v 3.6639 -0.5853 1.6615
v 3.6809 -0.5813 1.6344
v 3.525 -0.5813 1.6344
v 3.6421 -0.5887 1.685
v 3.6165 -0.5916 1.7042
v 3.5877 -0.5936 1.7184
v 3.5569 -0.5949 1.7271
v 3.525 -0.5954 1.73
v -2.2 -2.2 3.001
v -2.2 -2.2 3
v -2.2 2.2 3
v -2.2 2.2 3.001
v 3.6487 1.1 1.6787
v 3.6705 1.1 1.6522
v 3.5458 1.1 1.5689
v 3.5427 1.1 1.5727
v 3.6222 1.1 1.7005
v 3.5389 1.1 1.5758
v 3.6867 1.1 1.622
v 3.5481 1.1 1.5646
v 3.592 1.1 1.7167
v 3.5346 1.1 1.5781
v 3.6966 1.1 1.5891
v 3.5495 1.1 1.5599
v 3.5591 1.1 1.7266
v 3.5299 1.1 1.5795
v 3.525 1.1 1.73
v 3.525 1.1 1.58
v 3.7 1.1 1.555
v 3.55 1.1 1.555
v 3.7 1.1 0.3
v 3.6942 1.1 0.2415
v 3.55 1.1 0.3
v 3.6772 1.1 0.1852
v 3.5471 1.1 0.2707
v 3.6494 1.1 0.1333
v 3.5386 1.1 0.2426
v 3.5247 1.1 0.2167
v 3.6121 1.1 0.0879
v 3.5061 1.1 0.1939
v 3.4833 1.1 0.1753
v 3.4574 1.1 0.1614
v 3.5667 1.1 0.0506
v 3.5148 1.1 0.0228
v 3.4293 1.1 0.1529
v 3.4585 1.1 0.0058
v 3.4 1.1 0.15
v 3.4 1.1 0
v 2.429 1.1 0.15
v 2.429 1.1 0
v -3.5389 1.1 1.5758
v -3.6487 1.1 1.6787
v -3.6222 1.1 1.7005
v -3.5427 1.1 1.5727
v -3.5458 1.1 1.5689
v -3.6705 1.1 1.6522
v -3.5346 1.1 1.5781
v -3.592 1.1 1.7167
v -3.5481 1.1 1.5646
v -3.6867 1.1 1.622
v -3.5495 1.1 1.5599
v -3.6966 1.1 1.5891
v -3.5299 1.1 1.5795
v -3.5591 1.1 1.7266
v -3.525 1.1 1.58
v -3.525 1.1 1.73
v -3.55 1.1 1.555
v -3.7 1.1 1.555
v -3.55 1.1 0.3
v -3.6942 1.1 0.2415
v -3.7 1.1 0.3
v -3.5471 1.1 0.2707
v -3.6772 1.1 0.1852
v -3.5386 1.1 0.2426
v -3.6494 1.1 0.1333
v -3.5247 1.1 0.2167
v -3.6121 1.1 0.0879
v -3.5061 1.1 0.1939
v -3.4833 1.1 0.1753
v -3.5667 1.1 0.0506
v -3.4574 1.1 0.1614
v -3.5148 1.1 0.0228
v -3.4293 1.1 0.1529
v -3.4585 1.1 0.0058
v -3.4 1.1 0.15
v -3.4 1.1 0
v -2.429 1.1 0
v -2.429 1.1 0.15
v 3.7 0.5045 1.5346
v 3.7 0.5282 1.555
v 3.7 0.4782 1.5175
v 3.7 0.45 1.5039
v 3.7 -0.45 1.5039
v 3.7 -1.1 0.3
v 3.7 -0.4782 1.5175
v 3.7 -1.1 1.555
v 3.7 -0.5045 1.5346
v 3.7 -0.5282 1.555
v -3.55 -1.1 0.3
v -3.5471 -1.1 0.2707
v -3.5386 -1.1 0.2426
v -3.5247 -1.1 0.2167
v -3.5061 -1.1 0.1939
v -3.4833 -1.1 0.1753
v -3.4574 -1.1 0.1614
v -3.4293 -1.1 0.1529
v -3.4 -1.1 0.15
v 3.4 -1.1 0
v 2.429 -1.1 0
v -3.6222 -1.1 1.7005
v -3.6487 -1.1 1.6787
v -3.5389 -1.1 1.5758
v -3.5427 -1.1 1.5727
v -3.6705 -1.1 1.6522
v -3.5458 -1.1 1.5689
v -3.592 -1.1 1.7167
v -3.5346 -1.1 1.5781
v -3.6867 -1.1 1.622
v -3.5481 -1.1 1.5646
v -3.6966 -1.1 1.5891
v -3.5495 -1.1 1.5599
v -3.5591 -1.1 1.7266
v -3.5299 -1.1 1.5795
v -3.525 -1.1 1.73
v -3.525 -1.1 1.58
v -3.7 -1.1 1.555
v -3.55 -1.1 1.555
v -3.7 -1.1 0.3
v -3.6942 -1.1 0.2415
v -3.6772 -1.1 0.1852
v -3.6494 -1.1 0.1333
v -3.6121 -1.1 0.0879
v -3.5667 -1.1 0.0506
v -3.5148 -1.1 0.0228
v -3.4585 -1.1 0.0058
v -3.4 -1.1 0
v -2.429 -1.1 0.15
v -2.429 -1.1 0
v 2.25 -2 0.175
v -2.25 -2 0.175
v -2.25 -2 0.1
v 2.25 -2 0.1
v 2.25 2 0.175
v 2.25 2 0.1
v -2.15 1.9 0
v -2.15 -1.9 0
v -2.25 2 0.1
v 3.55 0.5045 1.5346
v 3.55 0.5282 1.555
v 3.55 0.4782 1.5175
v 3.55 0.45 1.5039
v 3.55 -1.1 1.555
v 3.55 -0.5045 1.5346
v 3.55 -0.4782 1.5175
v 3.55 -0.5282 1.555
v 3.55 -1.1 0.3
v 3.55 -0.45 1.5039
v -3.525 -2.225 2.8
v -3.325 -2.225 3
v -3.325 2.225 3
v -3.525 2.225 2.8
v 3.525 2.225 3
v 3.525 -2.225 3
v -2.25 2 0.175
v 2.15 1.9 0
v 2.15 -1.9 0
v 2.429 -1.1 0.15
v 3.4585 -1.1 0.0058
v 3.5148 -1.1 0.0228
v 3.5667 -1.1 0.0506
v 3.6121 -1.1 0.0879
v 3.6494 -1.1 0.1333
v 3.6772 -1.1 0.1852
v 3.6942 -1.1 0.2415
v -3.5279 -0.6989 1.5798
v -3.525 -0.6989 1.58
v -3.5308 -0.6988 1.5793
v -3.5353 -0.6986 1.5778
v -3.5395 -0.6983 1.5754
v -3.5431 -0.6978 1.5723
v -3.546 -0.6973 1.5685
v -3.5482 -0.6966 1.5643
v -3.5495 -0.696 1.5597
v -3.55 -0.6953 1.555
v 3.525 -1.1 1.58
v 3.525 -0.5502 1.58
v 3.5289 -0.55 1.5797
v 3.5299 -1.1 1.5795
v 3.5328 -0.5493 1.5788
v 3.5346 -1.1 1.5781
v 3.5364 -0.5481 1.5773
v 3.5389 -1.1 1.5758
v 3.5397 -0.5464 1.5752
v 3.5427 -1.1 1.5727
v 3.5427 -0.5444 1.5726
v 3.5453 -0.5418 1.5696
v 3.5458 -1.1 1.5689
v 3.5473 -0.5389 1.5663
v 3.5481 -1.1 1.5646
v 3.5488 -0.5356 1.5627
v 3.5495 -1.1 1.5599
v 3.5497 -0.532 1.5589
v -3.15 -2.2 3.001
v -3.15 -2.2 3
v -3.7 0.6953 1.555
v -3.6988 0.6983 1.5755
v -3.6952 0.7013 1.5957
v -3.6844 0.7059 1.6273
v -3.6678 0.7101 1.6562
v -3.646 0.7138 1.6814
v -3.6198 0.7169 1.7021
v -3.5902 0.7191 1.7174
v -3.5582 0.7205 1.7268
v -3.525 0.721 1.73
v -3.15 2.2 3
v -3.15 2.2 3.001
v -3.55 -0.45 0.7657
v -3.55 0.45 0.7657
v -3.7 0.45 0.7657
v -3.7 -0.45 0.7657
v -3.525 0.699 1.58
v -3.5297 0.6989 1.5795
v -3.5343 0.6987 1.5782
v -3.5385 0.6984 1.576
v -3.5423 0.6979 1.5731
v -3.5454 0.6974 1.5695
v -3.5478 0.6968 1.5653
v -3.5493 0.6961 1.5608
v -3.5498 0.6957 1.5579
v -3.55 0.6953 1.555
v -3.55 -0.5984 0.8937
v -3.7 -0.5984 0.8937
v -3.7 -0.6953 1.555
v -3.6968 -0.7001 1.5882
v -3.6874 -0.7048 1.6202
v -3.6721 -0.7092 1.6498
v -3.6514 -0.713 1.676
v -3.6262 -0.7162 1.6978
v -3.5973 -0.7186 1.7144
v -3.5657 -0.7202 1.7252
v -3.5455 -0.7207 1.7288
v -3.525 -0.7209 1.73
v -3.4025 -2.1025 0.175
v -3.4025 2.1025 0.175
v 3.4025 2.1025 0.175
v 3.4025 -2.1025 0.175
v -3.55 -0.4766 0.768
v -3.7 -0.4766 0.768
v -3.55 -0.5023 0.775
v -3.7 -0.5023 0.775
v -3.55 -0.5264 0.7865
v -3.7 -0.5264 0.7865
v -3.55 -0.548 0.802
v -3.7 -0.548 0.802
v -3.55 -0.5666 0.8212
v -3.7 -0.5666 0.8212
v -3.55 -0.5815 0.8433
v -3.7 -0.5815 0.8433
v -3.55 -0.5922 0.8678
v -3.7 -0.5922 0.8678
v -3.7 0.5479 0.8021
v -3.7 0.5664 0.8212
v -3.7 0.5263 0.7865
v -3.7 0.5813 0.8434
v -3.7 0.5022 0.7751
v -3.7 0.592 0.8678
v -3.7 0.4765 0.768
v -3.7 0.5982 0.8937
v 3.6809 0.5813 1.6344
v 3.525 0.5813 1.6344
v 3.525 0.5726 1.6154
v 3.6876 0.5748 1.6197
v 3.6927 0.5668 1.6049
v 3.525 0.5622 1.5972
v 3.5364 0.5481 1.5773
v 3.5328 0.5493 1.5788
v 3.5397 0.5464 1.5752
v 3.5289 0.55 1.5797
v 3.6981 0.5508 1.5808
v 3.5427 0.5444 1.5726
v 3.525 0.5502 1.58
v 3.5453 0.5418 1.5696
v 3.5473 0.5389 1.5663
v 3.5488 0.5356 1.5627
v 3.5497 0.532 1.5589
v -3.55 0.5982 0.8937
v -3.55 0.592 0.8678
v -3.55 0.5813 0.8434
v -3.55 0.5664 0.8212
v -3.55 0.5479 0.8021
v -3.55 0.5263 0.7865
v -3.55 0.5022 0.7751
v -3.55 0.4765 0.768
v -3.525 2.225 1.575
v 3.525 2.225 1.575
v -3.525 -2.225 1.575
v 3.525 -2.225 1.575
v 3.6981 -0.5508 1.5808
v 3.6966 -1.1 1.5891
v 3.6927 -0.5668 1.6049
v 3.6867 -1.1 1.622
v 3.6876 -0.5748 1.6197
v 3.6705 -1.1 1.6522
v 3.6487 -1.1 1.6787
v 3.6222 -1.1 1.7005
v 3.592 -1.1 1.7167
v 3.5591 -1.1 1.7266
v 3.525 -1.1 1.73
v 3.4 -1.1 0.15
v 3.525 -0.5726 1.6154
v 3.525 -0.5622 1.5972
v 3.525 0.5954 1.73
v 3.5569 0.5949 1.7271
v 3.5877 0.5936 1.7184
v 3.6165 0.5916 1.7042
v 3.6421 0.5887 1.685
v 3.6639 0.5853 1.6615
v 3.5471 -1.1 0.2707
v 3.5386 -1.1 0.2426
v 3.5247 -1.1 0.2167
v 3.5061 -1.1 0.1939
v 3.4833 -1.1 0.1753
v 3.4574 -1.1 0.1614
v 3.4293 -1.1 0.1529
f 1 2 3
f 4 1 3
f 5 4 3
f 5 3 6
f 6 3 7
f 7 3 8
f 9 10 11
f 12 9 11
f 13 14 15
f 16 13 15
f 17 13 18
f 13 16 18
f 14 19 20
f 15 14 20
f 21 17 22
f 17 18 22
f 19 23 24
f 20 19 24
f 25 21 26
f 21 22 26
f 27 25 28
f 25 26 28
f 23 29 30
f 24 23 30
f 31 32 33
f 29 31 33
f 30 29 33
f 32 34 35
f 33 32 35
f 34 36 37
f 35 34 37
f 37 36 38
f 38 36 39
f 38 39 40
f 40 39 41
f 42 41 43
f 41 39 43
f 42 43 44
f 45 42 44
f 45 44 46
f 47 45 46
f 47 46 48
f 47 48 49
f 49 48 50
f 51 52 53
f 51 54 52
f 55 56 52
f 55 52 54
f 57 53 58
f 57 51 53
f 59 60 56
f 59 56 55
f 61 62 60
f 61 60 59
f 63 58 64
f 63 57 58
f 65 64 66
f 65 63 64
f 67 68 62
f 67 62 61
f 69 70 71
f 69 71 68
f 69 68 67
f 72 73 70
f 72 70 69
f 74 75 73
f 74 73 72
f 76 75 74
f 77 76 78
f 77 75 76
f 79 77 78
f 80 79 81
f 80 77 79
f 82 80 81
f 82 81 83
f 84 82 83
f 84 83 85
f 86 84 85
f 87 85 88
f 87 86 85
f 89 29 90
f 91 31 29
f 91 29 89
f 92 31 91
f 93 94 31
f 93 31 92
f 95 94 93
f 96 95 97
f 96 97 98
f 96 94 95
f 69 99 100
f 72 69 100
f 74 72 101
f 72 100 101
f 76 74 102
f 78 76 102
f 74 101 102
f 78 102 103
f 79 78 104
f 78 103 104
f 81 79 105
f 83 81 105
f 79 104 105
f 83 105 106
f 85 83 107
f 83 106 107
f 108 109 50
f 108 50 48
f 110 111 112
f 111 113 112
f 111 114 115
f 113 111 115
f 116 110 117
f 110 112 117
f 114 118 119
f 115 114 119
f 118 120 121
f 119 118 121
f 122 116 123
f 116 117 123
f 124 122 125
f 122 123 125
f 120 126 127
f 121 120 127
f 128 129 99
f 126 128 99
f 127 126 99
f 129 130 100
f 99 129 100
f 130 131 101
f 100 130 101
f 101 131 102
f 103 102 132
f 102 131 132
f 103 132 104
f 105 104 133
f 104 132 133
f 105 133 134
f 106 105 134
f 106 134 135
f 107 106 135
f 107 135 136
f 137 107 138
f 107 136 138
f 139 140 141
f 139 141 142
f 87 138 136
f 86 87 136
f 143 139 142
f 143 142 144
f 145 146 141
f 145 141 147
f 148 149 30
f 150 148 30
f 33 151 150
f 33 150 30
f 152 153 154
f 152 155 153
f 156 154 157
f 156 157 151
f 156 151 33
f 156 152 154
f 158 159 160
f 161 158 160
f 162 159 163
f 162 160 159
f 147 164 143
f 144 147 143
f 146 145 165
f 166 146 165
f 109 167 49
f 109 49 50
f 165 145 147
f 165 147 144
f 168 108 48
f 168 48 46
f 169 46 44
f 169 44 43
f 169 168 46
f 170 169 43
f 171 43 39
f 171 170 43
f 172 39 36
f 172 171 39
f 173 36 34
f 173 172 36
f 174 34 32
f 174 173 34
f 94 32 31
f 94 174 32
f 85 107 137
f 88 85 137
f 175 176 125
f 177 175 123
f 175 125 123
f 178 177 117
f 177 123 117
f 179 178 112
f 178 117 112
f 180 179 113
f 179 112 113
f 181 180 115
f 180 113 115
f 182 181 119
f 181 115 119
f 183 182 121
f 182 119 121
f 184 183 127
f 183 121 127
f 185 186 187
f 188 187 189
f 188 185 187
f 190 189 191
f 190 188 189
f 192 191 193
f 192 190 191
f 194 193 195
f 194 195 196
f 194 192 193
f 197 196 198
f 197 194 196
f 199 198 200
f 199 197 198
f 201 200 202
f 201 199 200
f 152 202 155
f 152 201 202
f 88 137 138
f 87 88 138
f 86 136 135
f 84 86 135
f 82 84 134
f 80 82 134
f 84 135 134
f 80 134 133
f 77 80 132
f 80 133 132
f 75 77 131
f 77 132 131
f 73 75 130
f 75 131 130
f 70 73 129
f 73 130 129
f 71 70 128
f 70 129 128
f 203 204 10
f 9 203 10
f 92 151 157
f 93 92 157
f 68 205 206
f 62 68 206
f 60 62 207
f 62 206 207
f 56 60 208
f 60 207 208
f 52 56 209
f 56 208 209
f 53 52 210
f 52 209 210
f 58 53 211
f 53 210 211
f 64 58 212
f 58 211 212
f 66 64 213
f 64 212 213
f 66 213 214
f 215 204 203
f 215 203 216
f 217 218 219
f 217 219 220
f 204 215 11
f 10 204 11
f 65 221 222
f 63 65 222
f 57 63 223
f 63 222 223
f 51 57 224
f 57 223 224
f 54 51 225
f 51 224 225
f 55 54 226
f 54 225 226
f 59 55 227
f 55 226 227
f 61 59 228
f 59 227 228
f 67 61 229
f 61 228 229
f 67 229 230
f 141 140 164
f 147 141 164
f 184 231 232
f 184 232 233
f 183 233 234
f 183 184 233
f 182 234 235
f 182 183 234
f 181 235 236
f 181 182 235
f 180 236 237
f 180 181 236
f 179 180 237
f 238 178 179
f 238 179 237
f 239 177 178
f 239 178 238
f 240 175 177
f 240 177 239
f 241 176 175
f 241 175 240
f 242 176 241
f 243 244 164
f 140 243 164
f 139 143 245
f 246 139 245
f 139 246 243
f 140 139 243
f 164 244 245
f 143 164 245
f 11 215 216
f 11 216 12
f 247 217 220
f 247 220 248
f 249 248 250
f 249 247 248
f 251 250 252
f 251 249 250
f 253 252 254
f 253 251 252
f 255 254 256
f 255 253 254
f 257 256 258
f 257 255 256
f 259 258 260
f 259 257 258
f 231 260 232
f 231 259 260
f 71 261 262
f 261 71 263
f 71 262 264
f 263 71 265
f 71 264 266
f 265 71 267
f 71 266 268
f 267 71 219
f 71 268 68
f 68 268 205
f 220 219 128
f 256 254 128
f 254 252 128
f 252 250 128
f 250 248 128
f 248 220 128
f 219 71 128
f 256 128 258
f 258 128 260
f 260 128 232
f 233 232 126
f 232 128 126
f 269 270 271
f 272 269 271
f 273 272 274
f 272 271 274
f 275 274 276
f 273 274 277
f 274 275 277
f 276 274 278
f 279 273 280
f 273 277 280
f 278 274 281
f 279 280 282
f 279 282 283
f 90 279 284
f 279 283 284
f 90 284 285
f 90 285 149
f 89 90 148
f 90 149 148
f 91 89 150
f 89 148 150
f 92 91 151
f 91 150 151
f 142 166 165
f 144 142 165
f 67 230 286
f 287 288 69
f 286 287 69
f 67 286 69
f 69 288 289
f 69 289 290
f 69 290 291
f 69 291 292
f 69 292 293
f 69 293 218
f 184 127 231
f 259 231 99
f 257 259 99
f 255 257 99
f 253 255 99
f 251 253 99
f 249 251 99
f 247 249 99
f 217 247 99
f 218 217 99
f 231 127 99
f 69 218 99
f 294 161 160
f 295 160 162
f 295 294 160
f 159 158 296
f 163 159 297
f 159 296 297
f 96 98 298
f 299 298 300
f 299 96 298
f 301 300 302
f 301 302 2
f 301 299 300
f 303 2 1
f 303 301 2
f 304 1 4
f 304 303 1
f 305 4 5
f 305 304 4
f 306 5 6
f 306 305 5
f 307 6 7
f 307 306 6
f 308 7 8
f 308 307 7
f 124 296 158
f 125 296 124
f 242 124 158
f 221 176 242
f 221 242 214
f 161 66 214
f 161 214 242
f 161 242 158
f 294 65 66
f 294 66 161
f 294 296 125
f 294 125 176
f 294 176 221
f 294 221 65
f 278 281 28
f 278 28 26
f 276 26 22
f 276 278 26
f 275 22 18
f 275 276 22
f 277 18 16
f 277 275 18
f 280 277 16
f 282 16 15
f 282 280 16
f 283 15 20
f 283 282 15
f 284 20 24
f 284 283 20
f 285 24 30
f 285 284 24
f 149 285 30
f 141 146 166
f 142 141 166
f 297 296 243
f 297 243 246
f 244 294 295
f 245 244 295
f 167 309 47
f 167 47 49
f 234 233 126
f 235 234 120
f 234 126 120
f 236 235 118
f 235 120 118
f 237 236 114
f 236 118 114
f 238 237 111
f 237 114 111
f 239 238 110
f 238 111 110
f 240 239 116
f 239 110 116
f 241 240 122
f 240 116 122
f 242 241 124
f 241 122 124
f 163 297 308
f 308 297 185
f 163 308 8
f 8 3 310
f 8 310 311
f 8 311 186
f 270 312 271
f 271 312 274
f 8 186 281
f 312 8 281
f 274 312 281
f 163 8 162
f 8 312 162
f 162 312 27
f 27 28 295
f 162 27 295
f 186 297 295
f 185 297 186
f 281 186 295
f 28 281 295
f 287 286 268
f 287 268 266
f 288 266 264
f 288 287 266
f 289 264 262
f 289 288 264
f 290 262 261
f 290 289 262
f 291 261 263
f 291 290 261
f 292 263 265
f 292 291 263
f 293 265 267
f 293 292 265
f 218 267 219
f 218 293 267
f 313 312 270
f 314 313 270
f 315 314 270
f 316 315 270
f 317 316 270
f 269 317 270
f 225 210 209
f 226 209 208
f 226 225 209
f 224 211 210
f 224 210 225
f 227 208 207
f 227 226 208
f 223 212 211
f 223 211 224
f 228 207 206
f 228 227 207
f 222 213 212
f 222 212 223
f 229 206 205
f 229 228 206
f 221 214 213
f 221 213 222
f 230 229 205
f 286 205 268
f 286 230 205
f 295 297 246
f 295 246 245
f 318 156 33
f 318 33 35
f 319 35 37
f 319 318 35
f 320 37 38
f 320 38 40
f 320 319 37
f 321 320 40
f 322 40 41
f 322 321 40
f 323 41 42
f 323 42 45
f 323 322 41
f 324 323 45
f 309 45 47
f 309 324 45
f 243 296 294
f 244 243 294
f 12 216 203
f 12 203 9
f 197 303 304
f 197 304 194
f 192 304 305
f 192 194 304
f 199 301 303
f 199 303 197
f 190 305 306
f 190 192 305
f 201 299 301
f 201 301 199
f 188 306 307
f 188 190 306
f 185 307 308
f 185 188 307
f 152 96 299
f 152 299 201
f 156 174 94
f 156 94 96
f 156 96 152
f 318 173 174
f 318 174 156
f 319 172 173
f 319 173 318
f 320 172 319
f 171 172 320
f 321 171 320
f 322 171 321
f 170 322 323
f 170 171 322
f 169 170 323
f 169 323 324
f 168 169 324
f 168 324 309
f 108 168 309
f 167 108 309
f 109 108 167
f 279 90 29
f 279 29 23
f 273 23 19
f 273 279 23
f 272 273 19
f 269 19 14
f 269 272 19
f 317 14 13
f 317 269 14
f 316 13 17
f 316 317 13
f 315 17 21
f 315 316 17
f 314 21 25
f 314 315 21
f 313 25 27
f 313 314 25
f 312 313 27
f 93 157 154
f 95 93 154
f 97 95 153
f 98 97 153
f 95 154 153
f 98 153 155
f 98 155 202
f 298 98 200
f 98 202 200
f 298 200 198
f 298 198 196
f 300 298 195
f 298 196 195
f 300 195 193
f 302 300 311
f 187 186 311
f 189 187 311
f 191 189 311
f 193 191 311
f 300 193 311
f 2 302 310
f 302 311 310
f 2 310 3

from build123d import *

# Parameters (mm, degrees)
EXTRUDE_START        = 0.2
SKETCH_1_W           = 4.5
SKETCH_1_H           = 4
EXTRUDE_1_DEPTH      = 0.2
EXTRUDE_START_2      = 1.575
SKETCH_2_W           = 7.05
SKETCH_2_H           = 4.45
EXTRUDE_2_DEPTH      = 1.425
SKETCH_2_2_W         = 7.05
SKETCH_2_2_H         = 4.45
EXTRUDE_3_DEPTH      = 1.4
EXTRUDE_3_DRAFT      = -5
EXTRUDE_4_DEPTH      = 1.1
EXTRUDE_4_DEPTH_BACK = 1.1
CUT_EXTRUDE_START    = -3.525
CUT_EXTRUDE_1_DEPTH  = 0.3
CUT_EXTRUDE_START_2  = 3.525
CUT_EXTRUDE_2_DEPTH  = 0.5
CHAMFER_1_SIZE       = 0.2
CHAMFER_2_SIZE       = 0.1
EXTRUDE_START_3      = 3
SKETCH_7_W           = 0.95
SKETCH_7_H           = 4.4
EXTRUDE_5_DEPTH      = 0.001


with BuildPart() as part:
    # Эскиз1 → Бобышка-Вытянуть1 (new body)
    with BuildSketch(Plane.XY.offset(EXTRUDE_START)):
        Rectangle(SKETCH_1_W, SKETCH_1_H)
    extrude(amount=-EXTRUDE_1_DEPTH)


with BuildPart() as body_2:
    # Эскиз2 → Бобышка-Вытянуть2 (new body)
    with BuildSketch(Plane.XY.offset(EXTRUDE_START_2)):
        Rectangle(SKETCH_2_W, SKETCH_2_H)
    extrude(amount=EXTRUDE_2_DEPTH)



with BuildPart() as extrude_3_tool:
    # Эскиз2<2> → Бобышка-Вытянуть3 (with draft: the straight prism first)
    with BuildSketch(Plane.XY.offset(EXTRUDE_START_2)):
        Rectangle(SKETCH_2_2_W, SKETCH_2_2_H)
    extrude(amount=-EXTRUDE_3_DEPTH)
    # Бобышка-Вытянуть3: the draft: its side faces are tilted about the plane it starts from
    extrude_3_sides = [extrude_3_tool.faces().sort_by_distance(p)[0] for p in [
        (0, 2.225, 0.875),
        (-3.525, 0, 0.875),
        (0, -2.225, 0.875),
        (3.525, 0, 0.875),
    ]]
    draft(extrude_3_sides, Plane.XY.offset(EXTRUDE_START_2), EXTRUDE_3_DRAFT)


with BuildPart() as part_1:
    add(part.part)

    # Бобышка-Вытянуть3: add extrude_3_tool
    add(extrude_3_tool.part)


with BuildPart() as body_2_1:
    add(body_2.part)

    add(part_1.part)  # Бобышка-Вытянуть4 merges part
    # Эскиз3 → Бобышка-Вытянуть4 (add, two sides: drawn at the far end of the back side and taken through both)
    with BuildSketch(Plane(origin=(0, 0, 0), x_dir=(1, 0, 0), z_dir=(0, 1, 0)).offset(-EXTRUDE_4_DEPTH_BACK)):
        with BuildLine():
            Line((-2.429, -0.150000003), (-2.429, 0))
            Line((-2.429, 0), (-3.4, 0))
            ThreePointArc((-3.4, 0), (-3.612132034, -0.087867966), (-3.7, -0.3))
            Line((-3.7, -0.3), (-3.7, -1.555))
            ThreePointArc((-3.7, -1.555), (-3.648743687, -1.678743687), (-3.525, -1.73))
            Line((-3.525, -1.73), (-3.525, -1.579999997))
            ThreePointArc((-3.525, -1.579999997), (-3.542677667, -1.572677667), (-3.549999997, -1.555))
            Line((-3.549999997, -1.555), (-3.549999997, -0.3))
            ThreePointArc((-3.549999997, -0.3), (-3.506066015, -0.193933985), (-3.4, -0.150000003))
            Line((-3.4, -0.150000003), (-2.429, -0.150000003))
        make_face()
        with BuildLine():
            Line((3.525, -1.73), (3.525, -1.579999997))
            ThreePointArc((3.525, -1.579999997), (3.542677667, -1.572677667), (3.549999997, -1.555))
            Line((3.549999997, -1.555), (3.549999997, -0.3))
            ThreePointArc((3.549999997, -0.3), (3.506066015, -0.193933985), (3.4, -0.150000003))
            Line((3.4, -0.150000003), (2.429, -0.150000003))
            Line((2.429, -0.150000003), (2.429, 0))
            Line((2.429, 0), (3.4, 0))
            ThreePointArc((3.4, 0), (3.612132034, -0.087867966), (3.7, -0.3))
            Line((3.7, -0.3), (3.7, -1.555))
            ThreePointArc((3.7, -1.555), (3.648743687, -1.678743687), (3.525, -1.73))
        make_face()
    extrude(amount=EXTRUDE_4_DEPTH + EXTRUDE_4_DEPTH_BACK)

    # Эскиз6 → Вырез-Вытянуть1 (cut)
    with BuildSketch(Plane(origin=(0, 0, 0), x_dir=(0, 0, -1), z_dir=(1, 0, 0)).offset(CUT_EXTRUDE_START)):
        with BuildLine():
            Line((-0.765667903, 0.449999989), (-0.765667903, -0.450000011))
            ThreePointArc((-0.765667903, -0.450000011), (-0.802046232, -0.5480485), (-0.893714872, -0.598384864))
            Line((-0.893714872, -0.598384864), (-1.75337045, -0.724339871))
            Line((-1.75337045, -0.724339871), (-1.75337045, 0.724408738))
            Line((-1.75337045, 0.724408738), (-0.893668232, 0.598168725))
            ThreePointArc((-0.893668232, 0.598168725), (-0.8020993, 0.547900523), (-0.765667903, 0.449999989))
        make_face()
    extrude(amount=-CUT_EXTRUDE_1_DEPTH, mode=Mode.SUBTRACT)

    # Эскиз5 → Вырез-Вытянуть2 (cut)
    with BuildSketch(Plane(origin=(0, 0, 0), x_dir=(0, 0, -1), z_dir=(1, 0, 0)).offset(CUT_EXTRUDE_START_2)):
        with BuildLine():
            Line((-1.503947649, 0.45), (-1.503947649, -0.45))
            ThreePointArc((-1.503947649, -0.45), (-1.555789292, -0.528967365), (-1.634421568, -0.581315866))
            Line((-1.634421568, -0.581315866), (-1.833406663, -0.610535147))
            Line((-1.833406663, -0.610535147), (-1.833406663, 0.610535147))
            Line((-1.833406663, 0.610535147), (-1.634421568, 0.581315866))
            ThreePointArc((-1.634421568, 0.581315866), (-1.555789292, 0.528967365), (-1.503947649, 0.45))
        make_face()
    extrude(amount=CUT_EXTRUDE_2_DEPTH, mode=Mode.SUBTRACT)

    # Фаска1
    chamfer_1_edges = [body_2_1.edges().sort_by_distance(p)[0] for p in [
        (-3.525, 0, 3),
    ]]
    chamfer(chamfer_1_edges, length=CHAMFER_1_SIZE)

    # Фаска2
    chamfer_2_edges = [body_2_1.edges().sort_by_distance(p)[0] for p in [
        (-2.25, 0, 0),
        (0, 2, 0),
        (2.25, 0, 0),
        (0, -2, 0),
    ]]
    chamfer(chamfer_2_edges, length=CHAMFER_2_SIZE)


with BuildPart() as body_2_2:
    # Эскиз7 → Бобышка-Вытянуть5 (new body)
    with BuildSketch(Plane.XY.offset(EXTRUDE_START_3)):
        with Locations((-2.675, 0)):
            Rectangle(SKETCH_7_W, SKETCH_7_H)
    extrude(amount=EXTRUDE_5_DEPTH)


solid = Compound([body_2_1.part, body_2_2.part])
